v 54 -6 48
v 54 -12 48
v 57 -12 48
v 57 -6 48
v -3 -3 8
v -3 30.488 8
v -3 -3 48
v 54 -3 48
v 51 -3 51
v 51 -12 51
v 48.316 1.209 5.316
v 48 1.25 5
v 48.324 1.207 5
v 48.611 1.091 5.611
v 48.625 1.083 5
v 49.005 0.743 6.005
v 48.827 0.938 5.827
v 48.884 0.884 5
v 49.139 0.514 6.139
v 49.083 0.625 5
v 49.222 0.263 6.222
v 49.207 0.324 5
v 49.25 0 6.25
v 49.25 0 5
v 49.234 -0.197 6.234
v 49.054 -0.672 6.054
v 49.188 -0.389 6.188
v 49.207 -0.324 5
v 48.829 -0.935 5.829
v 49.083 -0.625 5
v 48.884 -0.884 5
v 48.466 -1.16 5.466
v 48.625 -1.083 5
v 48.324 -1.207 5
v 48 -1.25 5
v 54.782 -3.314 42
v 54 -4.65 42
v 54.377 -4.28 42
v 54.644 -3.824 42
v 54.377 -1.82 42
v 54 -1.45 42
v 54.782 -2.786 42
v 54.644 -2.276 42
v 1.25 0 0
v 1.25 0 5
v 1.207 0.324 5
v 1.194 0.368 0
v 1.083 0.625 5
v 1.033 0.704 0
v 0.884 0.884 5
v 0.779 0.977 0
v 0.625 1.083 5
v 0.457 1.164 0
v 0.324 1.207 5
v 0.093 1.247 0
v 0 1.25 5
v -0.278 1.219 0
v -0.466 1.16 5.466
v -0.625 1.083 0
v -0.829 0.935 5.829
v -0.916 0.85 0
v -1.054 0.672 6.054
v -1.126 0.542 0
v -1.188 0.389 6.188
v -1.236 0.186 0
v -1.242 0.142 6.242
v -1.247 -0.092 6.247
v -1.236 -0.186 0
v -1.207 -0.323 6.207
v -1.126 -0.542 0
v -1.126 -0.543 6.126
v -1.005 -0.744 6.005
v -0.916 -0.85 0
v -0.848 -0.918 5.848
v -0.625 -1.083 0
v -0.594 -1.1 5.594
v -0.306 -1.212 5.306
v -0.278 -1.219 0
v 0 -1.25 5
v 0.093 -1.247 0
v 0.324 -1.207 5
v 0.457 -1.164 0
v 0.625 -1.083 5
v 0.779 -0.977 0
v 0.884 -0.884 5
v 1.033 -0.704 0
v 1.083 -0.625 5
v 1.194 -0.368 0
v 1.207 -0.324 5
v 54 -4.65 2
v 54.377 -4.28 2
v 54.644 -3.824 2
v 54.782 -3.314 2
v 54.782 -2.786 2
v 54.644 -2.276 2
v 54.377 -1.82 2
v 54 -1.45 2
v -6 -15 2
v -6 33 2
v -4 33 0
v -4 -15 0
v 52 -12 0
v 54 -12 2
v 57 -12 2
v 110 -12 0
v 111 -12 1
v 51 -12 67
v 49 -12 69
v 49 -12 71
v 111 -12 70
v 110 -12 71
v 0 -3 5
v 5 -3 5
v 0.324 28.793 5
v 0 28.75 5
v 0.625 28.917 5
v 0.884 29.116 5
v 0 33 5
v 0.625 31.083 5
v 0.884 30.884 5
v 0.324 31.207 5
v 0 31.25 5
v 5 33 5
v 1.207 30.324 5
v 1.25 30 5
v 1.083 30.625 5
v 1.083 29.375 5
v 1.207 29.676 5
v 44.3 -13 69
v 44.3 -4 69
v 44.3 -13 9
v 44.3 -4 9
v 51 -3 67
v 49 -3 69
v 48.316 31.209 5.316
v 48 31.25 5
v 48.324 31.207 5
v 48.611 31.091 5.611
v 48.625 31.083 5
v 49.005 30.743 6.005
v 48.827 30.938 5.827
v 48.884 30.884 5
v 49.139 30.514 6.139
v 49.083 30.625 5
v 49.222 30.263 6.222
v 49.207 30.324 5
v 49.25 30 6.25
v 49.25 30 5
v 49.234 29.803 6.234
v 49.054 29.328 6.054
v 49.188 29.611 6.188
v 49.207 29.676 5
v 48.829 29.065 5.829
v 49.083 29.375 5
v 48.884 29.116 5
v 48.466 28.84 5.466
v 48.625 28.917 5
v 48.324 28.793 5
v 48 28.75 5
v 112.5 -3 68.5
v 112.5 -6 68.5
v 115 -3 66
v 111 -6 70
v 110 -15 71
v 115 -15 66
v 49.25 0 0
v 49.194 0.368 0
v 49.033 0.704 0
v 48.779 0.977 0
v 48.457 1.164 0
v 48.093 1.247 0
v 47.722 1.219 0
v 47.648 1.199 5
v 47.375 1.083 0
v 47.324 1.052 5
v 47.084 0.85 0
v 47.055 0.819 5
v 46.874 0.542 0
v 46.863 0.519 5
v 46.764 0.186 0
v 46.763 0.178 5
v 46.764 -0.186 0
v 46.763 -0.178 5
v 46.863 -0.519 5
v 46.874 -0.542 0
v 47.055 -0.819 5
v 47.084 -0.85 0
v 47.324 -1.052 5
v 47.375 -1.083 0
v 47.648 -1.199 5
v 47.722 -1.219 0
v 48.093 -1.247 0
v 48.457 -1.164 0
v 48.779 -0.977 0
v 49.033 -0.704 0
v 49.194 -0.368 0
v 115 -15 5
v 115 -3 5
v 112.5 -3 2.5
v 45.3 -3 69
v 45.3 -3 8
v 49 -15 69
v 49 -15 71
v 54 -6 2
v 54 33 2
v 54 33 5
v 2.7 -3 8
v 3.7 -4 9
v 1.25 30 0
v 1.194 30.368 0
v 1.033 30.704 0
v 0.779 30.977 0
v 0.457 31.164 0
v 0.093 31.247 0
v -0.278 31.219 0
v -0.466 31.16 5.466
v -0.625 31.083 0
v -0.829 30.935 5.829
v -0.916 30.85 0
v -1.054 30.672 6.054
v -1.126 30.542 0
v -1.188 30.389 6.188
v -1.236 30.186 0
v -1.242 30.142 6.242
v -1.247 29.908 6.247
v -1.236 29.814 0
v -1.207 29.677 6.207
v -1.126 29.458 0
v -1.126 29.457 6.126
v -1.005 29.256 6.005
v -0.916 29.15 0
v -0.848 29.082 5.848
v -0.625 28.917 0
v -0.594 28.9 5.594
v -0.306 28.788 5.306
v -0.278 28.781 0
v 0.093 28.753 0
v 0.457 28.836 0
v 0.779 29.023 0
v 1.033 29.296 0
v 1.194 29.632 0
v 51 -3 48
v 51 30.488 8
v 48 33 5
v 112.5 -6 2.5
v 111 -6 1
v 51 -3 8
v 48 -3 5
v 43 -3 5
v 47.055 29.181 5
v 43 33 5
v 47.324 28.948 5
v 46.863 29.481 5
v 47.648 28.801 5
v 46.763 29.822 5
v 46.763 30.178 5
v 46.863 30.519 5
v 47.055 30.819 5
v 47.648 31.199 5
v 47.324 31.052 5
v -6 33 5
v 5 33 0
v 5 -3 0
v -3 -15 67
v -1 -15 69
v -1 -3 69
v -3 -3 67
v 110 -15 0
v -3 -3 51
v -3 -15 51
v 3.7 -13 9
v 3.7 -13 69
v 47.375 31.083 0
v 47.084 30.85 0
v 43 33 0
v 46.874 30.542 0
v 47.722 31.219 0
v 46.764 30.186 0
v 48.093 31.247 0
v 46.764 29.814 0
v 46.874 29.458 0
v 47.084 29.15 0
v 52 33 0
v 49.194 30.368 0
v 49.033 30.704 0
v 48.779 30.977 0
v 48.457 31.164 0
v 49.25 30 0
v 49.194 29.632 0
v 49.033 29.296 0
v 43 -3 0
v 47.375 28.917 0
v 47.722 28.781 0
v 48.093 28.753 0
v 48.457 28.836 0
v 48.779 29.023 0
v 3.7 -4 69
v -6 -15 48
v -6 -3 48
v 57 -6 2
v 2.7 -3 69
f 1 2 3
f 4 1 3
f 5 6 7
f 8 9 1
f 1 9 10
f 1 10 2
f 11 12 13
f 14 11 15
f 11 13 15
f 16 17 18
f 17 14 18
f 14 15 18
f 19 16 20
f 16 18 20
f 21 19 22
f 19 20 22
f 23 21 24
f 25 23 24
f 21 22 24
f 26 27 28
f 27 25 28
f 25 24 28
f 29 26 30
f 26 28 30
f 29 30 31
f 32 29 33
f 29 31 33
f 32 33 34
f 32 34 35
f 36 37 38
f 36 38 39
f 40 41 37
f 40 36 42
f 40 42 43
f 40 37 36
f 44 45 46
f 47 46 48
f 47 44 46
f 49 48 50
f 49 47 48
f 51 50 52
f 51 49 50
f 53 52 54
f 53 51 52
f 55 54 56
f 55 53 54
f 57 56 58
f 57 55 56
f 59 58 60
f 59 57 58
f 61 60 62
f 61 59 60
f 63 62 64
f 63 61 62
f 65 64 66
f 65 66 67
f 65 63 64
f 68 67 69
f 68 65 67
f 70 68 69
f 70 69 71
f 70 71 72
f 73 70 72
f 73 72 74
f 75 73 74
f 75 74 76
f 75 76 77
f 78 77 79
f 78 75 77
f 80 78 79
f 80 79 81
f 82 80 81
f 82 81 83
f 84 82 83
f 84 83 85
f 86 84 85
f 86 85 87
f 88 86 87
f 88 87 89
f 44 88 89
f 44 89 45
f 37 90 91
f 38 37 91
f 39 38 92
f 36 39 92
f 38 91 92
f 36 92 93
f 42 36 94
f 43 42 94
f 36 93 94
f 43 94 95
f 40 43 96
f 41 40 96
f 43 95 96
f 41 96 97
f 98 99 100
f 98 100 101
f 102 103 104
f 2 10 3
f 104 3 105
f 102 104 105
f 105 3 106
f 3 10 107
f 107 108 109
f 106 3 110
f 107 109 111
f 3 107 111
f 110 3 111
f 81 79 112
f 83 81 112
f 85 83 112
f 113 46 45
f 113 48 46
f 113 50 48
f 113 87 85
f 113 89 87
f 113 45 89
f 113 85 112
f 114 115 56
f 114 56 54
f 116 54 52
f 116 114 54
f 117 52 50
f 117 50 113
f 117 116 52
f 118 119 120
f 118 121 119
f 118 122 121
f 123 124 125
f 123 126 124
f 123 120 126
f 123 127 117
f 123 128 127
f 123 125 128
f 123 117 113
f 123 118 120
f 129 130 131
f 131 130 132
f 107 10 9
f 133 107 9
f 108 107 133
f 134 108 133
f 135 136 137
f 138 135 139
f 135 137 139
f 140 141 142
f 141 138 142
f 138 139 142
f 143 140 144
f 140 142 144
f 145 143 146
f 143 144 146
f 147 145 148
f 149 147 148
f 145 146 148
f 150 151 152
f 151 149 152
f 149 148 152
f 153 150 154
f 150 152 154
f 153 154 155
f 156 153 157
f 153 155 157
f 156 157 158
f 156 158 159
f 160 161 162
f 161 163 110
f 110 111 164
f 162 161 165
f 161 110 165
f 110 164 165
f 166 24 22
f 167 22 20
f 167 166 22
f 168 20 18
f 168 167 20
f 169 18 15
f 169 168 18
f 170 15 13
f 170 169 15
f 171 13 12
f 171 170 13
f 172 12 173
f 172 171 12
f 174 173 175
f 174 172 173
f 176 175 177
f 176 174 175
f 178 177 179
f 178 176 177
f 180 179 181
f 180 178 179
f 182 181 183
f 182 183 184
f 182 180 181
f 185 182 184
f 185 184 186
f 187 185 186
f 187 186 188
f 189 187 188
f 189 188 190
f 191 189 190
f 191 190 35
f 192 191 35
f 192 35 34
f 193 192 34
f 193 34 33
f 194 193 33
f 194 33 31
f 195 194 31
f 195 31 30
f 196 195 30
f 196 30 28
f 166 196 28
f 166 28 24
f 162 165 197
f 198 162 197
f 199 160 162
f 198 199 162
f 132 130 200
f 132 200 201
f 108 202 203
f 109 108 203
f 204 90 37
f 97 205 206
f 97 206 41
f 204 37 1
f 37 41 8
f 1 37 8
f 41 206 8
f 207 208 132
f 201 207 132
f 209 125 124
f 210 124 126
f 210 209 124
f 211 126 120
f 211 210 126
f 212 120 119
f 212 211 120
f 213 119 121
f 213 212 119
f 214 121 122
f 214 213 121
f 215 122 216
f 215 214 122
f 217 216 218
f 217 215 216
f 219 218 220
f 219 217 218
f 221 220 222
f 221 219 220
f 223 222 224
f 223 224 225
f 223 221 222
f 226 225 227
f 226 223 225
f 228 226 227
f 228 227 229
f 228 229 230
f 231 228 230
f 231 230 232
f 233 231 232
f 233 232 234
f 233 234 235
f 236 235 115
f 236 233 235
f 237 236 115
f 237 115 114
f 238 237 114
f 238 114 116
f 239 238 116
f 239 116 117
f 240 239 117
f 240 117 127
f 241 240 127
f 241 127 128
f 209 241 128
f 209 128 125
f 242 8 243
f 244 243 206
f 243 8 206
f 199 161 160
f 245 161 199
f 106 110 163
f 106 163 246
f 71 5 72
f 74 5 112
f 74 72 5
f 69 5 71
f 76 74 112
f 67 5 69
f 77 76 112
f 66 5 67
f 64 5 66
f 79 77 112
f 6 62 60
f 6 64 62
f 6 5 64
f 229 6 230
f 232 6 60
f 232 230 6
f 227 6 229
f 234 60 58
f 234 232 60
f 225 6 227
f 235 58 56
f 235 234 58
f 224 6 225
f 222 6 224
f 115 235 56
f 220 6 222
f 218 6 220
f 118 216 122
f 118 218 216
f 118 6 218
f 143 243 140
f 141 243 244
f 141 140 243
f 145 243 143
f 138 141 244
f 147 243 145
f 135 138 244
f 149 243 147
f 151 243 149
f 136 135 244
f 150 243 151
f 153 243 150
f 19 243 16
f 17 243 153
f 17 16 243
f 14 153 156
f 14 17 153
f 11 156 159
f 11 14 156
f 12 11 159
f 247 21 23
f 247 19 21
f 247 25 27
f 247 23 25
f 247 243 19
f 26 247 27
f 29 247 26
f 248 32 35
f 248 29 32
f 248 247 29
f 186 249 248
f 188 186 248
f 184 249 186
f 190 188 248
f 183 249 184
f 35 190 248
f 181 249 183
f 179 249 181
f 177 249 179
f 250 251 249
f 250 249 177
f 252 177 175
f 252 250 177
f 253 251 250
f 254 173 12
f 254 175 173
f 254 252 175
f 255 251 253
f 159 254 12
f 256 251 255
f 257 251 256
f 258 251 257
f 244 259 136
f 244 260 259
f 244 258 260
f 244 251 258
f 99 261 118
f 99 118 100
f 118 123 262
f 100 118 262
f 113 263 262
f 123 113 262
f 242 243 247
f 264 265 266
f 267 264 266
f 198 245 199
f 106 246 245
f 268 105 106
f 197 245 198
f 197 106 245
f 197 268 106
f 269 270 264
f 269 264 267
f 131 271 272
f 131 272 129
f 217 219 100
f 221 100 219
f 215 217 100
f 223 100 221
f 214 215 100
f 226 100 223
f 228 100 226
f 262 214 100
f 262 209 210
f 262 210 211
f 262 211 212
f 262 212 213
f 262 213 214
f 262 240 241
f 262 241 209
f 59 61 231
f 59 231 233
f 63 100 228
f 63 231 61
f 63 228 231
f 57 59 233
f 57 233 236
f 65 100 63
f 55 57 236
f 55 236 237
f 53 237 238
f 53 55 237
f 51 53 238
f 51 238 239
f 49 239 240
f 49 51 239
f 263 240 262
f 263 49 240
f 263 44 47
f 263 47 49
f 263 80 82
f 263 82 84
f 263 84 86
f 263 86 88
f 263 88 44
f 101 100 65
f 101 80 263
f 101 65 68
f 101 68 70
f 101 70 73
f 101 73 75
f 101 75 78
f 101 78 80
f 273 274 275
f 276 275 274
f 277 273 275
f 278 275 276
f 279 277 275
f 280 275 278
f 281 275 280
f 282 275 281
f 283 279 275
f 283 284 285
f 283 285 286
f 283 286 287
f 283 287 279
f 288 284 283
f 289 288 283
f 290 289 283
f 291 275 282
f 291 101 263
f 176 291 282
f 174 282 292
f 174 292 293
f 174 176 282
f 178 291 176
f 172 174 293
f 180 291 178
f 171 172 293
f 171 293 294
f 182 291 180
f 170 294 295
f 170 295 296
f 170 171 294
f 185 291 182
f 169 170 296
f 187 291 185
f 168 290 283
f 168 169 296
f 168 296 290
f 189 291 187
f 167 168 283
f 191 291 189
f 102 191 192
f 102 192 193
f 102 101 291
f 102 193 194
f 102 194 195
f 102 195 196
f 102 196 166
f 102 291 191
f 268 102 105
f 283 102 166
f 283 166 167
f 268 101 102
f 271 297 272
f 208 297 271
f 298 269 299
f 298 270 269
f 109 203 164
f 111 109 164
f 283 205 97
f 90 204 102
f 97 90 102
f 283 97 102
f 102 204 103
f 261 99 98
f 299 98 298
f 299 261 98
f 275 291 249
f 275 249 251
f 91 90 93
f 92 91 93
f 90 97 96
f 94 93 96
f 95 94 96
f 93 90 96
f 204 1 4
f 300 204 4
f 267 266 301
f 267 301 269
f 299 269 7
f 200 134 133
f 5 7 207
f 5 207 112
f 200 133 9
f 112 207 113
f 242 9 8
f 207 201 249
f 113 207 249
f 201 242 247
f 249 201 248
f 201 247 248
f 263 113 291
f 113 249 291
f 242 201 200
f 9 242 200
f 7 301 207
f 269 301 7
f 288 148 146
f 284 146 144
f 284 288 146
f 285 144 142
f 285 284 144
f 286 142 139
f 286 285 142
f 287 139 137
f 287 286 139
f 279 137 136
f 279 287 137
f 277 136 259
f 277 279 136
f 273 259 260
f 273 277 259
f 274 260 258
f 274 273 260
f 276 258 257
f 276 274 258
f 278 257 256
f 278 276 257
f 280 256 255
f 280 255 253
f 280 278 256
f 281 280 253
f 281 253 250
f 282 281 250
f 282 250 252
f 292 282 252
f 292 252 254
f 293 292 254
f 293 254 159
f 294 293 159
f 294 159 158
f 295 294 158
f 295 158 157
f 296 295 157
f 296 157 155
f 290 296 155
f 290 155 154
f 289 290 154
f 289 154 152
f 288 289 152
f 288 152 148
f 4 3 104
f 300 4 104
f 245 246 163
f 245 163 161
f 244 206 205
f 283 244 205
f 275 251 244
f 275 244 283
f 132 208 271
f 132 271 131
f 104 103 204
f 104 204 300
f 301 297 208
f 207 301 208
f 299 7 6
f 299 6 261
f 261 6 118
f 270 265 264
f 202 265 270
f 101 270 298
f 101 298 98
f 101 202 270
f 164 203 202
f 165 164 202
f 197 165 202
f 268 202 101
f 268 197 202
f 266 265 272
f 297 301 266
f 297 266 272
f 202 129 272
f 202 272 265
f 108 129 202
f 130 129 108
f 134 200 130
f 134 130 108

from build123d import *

# Parameters (mm, degrees)
SKETCH1_W             = 8
SKETCH1_H             = 36
SKETCH1_R             = 1.25
BOSS_EXTRUDE1_DEPTH   = 5
BOSS_EXTRUDE1_2_DEPTH = 5
SKETCH2_W             = 54
SKETCH2_H             = 5
BOSS_EXTRUDE2_DEPTH   = 12
SKETCH4_W             = 54
SKETCH4_H             = 12
BOSS_EXTRUDE3_DEPTH   = 64
SKETCH5_W             = 40.6
SKETCH5_H             = 60.5
CUT_EXTRUDE1_DEPTH    = 10
BOSS_EXTRUDE4_DEPTH   = 3
BOSS_EXTRUDE5_START   = -54
BOSS_EXTRUDE5_DEPTH   = 3
CHAMFER1_SIZE         = 2
CHAMFER2_SIZE         = 1
CHAMFER3_SIZE         = 3
SKETCH8_W             = 66
SKETCH8_H             = 71
BOSS_EXTRUDE6_DEPTH   = 3
SKETCH9_W             = 3
SKETCH9_H             = 46
SKETCH9_W_2           = 4
SKETCH9_H_2           = 71
BOSS_EXTRUDE7_DEPTH   = 6
BOSS_EXTRUDE8_DEPTH   = 40
SKETCH12_W            = 2.5
SKETCH12_H            = 71
BOSS_EXTRUDE9_DEPTH   = 3
CHAMFER4_SIZE         = 5


with BuildPart() as part:
    # Sketch1 → Boss-Extrude1 (new body)
    with BuildSketch(Plane.XY):
        with Locations((1, 15)):
            Rectangle(SKETCH1_W, SKETCH1_H)
        Circle(SKETCH1_R, mode=Mode.SUBTRACT)
        with Locations((0, 30)):
            Circle(SKETCH1_R, mode=Mode.SUBTRACT)
    extrude(amount=BOSS_EXTRUDE1_DEPTH)



with BuildPart() as body_2:
    # Sketch1 → Boss-Extrude1 2 (new body)
    with BuildSketch(Plane.XY):
        with Locations((47, 15)):
            Rectangle(SKETCH1_W, SKETCH1_H)
        with Locations((48, 0)):
            Circle(SKETCH1_R, mode=Mode.SUBTRACT)
        with Locations((48, 30)):
            Circle(SKETCH1_R, mode=Mode.SUBTRACT)
    extrude(amount=BOSS_EXTRUDE1_2_DEPTH)


with BuildPart() as part_1:
    add(part.part)

    add(body_2.part)  # Boss-Extrude2 merges body 2
    # Sketch2 → Boss-Extrude2 (add)
    with BuildSketch(Plane.XZ.offset(3)):
        with Locations((24, 2.5)):
            Rectangle(SKETCH2_W, SKETCH2_H)
    extrude(amount=BOSS_EXTRUDE2_DEPTH)

    # Sketch4 → Boss-Extrude3 (add)
    with BuildSketch(Plane.XY.offset(5)):
        with Locations((24, -9)):
            Rectangle(SKETCH4_W, SKETCH4_H)
    extrude(amount=BOSS_EXTRUDE3_DEPTH)

    # Sketch5 → Cut-Extrude1 (cut)
    with BuildSketch(Plane(origin=(0, -3, 0), x_dir=(1, 0, 0), z_dir=(0, 1, 0))):
        with Locations((24, -39.25)):
            Rectangle(SKETCH5_W, SKETCH5_H)
    extrude(amount=-CUT_EXTRUDE1_DEPTH, mode=Mode.SUBTRACT)

    # Sketch7 → Boss-Extrude4 (add)
    with BuildSketch(Plane.ZY.offset(3)):
        Polygon((0, 33), (0, -15), (48, -15), (48, -3), (5, 33), align=None)
    extrude(amount=BOSS_EXTRUDE4_DEPTH)

    # Sketch7<2> → Boss-Extrude5 (add)
    with BuildSketch(Plane.ZY.offset(3).offset(BOSS_EXTRUDE5_START)):
        Polygon((0, 33), (0, -15), (48, -15), (48, -3), (5, 33), align=None)
    extrude(amount=-BOSS_EXTRUDE5_DEPTH)

    # Chamfer1
    chamfer1_edges = [part_1.edges().sort_by_distance(p)[0] for p in [
        (-3, -9, 69),
        (51, -9, 69),
        (-6, 9, 0),
        (54, 9, 0),
    ]]
    chamfer(chamfer1_edges, length=CHAMFER1_SIZE)

    # Chamfer2
    chamfer2_edges = [part_1.edges().sort_by_distance(p)[0] for p in [
        (44.3, -3, 39),
        (24, -3, 9),
        (3.7, -3, 39),
    ]]
    chamfer(chamfer2_edges, length=CHAMFER2_SIZE)

    # Chamfer3
    # the kernel refuses this chamfer: 3 mm, written as the material it adds along each edge
    with BuildSketch(Plane(origin=(51, -15, 48), x_dir=(-0.027495876610584467, 0, 0.9996219169112969), z_dir=(0, 1, 0))) as chamfer3_piece_1_section:
        Polygon((CHAMFER3_SIZE * 0.999621916911, CHAMFER3_SIZE * 0.0274958766106), (-CHAMFER3_SIZE * 0.0274958766106, CHAMFER3_SIZE * 0.999621916911), (0, 0), align=None)
    chamfer3_piece_1 = extrude(amount=12, mode=Mode.PRIVATE)
    chamfer3_piece_1 = split(chamfer3_piece_1, bisect_by=Plane(origin=(54, -9.397887016, 48.948587344), z_dir=(-1, 0, 0)), keep=Keep.TOP, mode=Mode.PRIVATE)
    chamfer3_piece_1 = split(chamfer3_piece_1, bisect_by=Plane(origin=(52.008422093, -6.10336241, 51.70679399), z_dir=(0, -0.7667576729931039, -0.6419366564593428)), keep=Keep.TOP, mode=Mode.PRIVATE)
    add(chamfer3_piece_1)
    with BuildSketch(Plane(origin=(51, -15, 48), x_dir=(-0.027495876610584467, 0, 0.9996219169112969), z_dir=(0, 1, 0))) as chamfer3_piece_2_section:
        Polygon((CHAMFER3_SIZE * 0.999621916911, CHAMFER3_SIZE * 0.0274958766106), (-CHAMFER3_SIZE * 0.0274958766106, CHAMFER3_SIZE * 0.999621916911), (0, 0), align=None)
    chamfer3_piece_2 = extrude(amount=12, mode=Mode.PRIVATE)
    chamfer3_piece_2 = split(chamfer3_piece_2, bisect_by=Plane(origin=(51.683373084, -4.039508932, 49.241635668), z_dir=(0, 0.7667576729931039, 0.6419366564593428)), keep=Keep.TOP, mode=Mode.PRIVATE)
    add(chamfer3_piece_2)
    with BuildSketch(Plane(origin=(-3, -15, 48), x_dir=(0.027495876610586334, 0, 0.9996219169112968), z_dir=(0, 1, 0))) as chamfer3_piece_3_section:
        Polygon((CHAMFER3_SIZE * 0.999621916911, -CHAMFER3_SIZE * 0.0274958766106), (-CHAMFER3_SIZE * 0.0274958766106, -CHAMFER3_SIZE * 0.999621916911), (0, 0), align=None)
    chamfer3_piece_3 = extrude(amount=12, mode=Mode.PRIVATE)
    chamfer3_piece_3 = split(chamfer3_piece_3, bisect_by=Plane(origin=(-6, -9.397887016, 48.948587344), z_dir=(1, 0, 0)), keep=Keep.TOP, mode=Mode.PRIVATE)
    chamfer3_piece_3 = split(chamfer3_piece_3, bisect_by=Plane(origin=(-4.008422093, -6.10336241, 51.70679399), z_dir=(0, -0.7667576729931039, -0.6419366564593428)), keep=Keep.TOP, mode=Mode.PRIVATE)
    add(chamfer3_piece_3)
    with BuildSketch(Plane(origin=(-3, -15, 48), x_dir=(0.027495876610586334, 0, 0.9996219169112968), z_dir=(0, 1, 0))) as chamfer3_piece_4_section:
        Polygon((CHAMFER3_SIZE * 0.999621916911, -CHAMFER3_SIZE * 0.0274958766106), (-CHAMFER3_SIZE * 0.0274958766106, -CHAMFER3_SIZE * 0.999621916911), (0, 0), align=None)
    chamfer3_piece_4 = extrude(amount=12, mode=Mode.PRIVATE)
    chamfer3_piece_4 = split(chamfer3_piece_4, bisect_by=Plane(origin=(-3.683373084, -4.039508932, 49.241635668), z_dir=(0, 0.7667576729931039, 0.6419366564593428)), keep=Keep.TOP, mode=Mode.PRIVATE)
    add(chamfer3_piece_4)
    with BuildSketch(Plane(origin=(-3, 33, 5), x_dir=(-0.02749587661058635, 0, 0.9996219169112968), z_dir=(0, -1, 0))) as chamfer3_piece_5_section:
        Polygon((CHAMFER3_SIZE * 0.999621916911, -CHAMFER3_SIZE * 0.0274958766106), (-CHAMFER3_SIZE * 0.0274958766106, -CHAMFER3_SIZE * 0.999621916911), (0, 0), align=None)
    chamfer3_piece_5 = extrude(amount=43.715048964, mode=Mode.PRIVATE)
    chamfer3_piece_5 = split(chamfer3_piece_5, bisect_by=Plane(origin=(-2.02772284, 24.92424675, 14.646038604), z_dir=(0, -0.7667576729931039, -0.6419366564593428)), keep=Keep.TOP, mode=Mode.PRIVATE)
    chamfer3_piece_5 = chamfer3_piece_5 - Plane(origin=(0, 0, 5.988374144), x_dir=(1, 0, 0), z_dir=(0, 0, -1)) * Cylinder(1.25, 100, mode=Mode.PRIVATE)
    chamfer3_piece_5 = chamfer3_piece_5 - Plane(origin=(0, 30, 5.988374144), x_dir=(1, 0, 0), z_dir=(0, 0, -1)) * Cylinder(1.25, 100, mode=Mode.PRIVATE)
    add(chamfer3_piece_5)
    with BuildSketch(Plane(origin=(51, -10.715048964, 5), x_dir=(0.02749587661058678, 0, 0.9996219169112968), z_dir=(0, 1, 0))) as chamfer3_piece_6_section:
        Polygon((CHAMFER3_SIZE * 0.999621916911, -CHAMFER3_SIZE * 0.0274958766106), (-CHAMFER3_SIZE * 0.0274958766106, -CHAMFER3_SIZE * 0.999621916911), (0, 0), align=None)
    chamfer3_piece_6 = extrude(amount=43.715048964, mode=Mode.PRIVATE)
    chamfer3_piece_6 = split(chamfer3_piece_6, bisect_by=Plane(origin=(50.01061912, 16.088421834, 25.199940587), z_dir=(0, -0.7667576729931039, -0.6419366564593428)), keep=Keep.TOP, mode=Mode.PRIVATE)
    chamfer3_piece_6 = chamfer3_piece_6 - Plane(origin=(48, 0, 5.98938088), x_dir=(1, 0, 0), z_dir=(0, 0, -1)) * Cylinder(1.25, 100, mode=Mode.PRIVATE)
    chamfer3_piece_6 = chamfer3_piece_6 - Plane(origin=(48, 30, 5.98938088), x_dir=(1, 0, 0), z_dir=(0, 0, -1)) * Cylinder(1.25, 100, mode=Mode.PRIVATE)
    add(chamfer3_piece_6)

    # Sketch8 → Boss-Extrude6 (add)
    with BuildSketch(Plane.XZ.offset(15)):
        with Locations((82, 35.5)):
            Rectangle(SKETCH8_W, SKETCH8_H)
    extrude(amount=-BOSS_EXTRUDE6_DEPTH)

    # Sketch9 → Boss-Extrude7 (add)
    with BuildSketch(Plane(origin=(0, -12, 0), x_dir=(1, 0, 0), z_dir=(0, 1, 0))):
        with Locations((55.5, -25)):
            Rectangle(SKETCH9_W, SKETCH9_H)
        with Locations((113, -35.5)):
            Rectangle(SKETCH9_W_2, SKETCH9_H_2)
    extrude(amount=BOSS_EXTRUDE7_DEPTH)

    # Sketch11 → Boss-Extrude8 (add)
    with BuildSketch(Plane(origin=(0, 0, 2), x_dir=(-1, 0, 0), z_dir=(0, 0, -1))):
        with BuildLine():
            Line((-54, -1.45), (-54, -4.65))
            ThreePointArc((-54, -4.65), (-54.8, -3.05), (-54, -1.45))
        make_face()
    extrude(amount=-BOSS_EXTRUDE8_DEPTH)

    # Sketch12 → Boss-Extrude9 (add)
    with BuildSketch(Plane(origin=(0, -6, 0), x_dir=(1, 0, 0), z_dir=(0, 1, 0))):
        with Locations((113.75, -35.5)):
            Rectangle(SKETCH12_W, SKETCH12_H)
    extrude(amount=BOSS_EXTRUDE9_DEPTH)

    # Chamfer4
    # the kernel refuses this chamfer: 5 mm, written as the material it takes off along each edge
    with BuildSketch(Plane(origin=(115, -12, 0), x_dir=(-0.9996219169112968, 0, -0.027495876610586334), z_dir=(0, 1, 0))) as chamfer4_piece_1:
        Polygon((CHAMFER4_SIZE * 0.999621916911, CHAMFER4_SIZE * 0.0274958766106), (-CHAMFER4_SIZE * 0.0274958766106, CHAMFER4_SIZE * 0.999621916911), (0, 0), align=None)
    extrude(amount=6, mode=Mode.SUBTRACT)
    with BuildSketch(Plane(origin=(115, -12, 71), x_dir=(-0.9996219169112968, 0, 0.027495876610587663), z_dir=(0, 1, 0))) as chamfer4_piece_2:
        Polygon((CHAMFER4_SIZE * 0.999621916911, -CHAMFER4_SIZE * 0.0274958766106), (-CHAMFER4_SIZE * 0.0274958766106, -CHAMFER4_SIZE * 0.999621916911), (0, 0), align=None)
    extrude(amount=6, mode=Mode.SUBTRACT)
    with BuildSketch(Plane(origin=(115, -27.85841494, 71), x_dir=(-0.9996219169112968, 0, 0.027495876610587663), z_dir=(0, 1, 0)), Plane(origin=(115, -6, 71), x_dir=(-0.9996219169112968, 0, 0.027495876610587663), z_dir=(0, 1, 0))) as chamfer4_piece_3:
        Polygon((CHAMFER4_SIZE * 0.999621916911, -CHAMFER4_SIZE * 0.0274958766106), (-CHAMFER4_SIZE * 0.0274958766106, -CHAMFER4_SIZE * 0.999621916911), (0, 0), align=None)
    extrude(amount=15.85841494, mode=Mode.SUBTRACT)
    with BuildSketch(Plane(origin=(115, -27.85841494, 0), x_dir=(-0.9996219169112968, 0, -0.02749587661058646), z_dir=(0, 1, 0)), Plane(origin=(115, -6, 0), x_dir=(-0.9996219169112968, 0, -0.02749587661058634), z_dir=(0, 1, 0))) as chamfer4_piece_4:
        Polygon((CHAMFER4_SIZE * 0.999621916911, CHAMFER4_SIZE * 0.0274958766106), (-CHAMFER4_SIZE * 0.0274958766106, CHAMFER4_SIZE * 0.999621916911), (0, 0), align=None)
    extrude(amount=15.85841494, mode=Mode.SUBTRACT)


solid = part_1.part
